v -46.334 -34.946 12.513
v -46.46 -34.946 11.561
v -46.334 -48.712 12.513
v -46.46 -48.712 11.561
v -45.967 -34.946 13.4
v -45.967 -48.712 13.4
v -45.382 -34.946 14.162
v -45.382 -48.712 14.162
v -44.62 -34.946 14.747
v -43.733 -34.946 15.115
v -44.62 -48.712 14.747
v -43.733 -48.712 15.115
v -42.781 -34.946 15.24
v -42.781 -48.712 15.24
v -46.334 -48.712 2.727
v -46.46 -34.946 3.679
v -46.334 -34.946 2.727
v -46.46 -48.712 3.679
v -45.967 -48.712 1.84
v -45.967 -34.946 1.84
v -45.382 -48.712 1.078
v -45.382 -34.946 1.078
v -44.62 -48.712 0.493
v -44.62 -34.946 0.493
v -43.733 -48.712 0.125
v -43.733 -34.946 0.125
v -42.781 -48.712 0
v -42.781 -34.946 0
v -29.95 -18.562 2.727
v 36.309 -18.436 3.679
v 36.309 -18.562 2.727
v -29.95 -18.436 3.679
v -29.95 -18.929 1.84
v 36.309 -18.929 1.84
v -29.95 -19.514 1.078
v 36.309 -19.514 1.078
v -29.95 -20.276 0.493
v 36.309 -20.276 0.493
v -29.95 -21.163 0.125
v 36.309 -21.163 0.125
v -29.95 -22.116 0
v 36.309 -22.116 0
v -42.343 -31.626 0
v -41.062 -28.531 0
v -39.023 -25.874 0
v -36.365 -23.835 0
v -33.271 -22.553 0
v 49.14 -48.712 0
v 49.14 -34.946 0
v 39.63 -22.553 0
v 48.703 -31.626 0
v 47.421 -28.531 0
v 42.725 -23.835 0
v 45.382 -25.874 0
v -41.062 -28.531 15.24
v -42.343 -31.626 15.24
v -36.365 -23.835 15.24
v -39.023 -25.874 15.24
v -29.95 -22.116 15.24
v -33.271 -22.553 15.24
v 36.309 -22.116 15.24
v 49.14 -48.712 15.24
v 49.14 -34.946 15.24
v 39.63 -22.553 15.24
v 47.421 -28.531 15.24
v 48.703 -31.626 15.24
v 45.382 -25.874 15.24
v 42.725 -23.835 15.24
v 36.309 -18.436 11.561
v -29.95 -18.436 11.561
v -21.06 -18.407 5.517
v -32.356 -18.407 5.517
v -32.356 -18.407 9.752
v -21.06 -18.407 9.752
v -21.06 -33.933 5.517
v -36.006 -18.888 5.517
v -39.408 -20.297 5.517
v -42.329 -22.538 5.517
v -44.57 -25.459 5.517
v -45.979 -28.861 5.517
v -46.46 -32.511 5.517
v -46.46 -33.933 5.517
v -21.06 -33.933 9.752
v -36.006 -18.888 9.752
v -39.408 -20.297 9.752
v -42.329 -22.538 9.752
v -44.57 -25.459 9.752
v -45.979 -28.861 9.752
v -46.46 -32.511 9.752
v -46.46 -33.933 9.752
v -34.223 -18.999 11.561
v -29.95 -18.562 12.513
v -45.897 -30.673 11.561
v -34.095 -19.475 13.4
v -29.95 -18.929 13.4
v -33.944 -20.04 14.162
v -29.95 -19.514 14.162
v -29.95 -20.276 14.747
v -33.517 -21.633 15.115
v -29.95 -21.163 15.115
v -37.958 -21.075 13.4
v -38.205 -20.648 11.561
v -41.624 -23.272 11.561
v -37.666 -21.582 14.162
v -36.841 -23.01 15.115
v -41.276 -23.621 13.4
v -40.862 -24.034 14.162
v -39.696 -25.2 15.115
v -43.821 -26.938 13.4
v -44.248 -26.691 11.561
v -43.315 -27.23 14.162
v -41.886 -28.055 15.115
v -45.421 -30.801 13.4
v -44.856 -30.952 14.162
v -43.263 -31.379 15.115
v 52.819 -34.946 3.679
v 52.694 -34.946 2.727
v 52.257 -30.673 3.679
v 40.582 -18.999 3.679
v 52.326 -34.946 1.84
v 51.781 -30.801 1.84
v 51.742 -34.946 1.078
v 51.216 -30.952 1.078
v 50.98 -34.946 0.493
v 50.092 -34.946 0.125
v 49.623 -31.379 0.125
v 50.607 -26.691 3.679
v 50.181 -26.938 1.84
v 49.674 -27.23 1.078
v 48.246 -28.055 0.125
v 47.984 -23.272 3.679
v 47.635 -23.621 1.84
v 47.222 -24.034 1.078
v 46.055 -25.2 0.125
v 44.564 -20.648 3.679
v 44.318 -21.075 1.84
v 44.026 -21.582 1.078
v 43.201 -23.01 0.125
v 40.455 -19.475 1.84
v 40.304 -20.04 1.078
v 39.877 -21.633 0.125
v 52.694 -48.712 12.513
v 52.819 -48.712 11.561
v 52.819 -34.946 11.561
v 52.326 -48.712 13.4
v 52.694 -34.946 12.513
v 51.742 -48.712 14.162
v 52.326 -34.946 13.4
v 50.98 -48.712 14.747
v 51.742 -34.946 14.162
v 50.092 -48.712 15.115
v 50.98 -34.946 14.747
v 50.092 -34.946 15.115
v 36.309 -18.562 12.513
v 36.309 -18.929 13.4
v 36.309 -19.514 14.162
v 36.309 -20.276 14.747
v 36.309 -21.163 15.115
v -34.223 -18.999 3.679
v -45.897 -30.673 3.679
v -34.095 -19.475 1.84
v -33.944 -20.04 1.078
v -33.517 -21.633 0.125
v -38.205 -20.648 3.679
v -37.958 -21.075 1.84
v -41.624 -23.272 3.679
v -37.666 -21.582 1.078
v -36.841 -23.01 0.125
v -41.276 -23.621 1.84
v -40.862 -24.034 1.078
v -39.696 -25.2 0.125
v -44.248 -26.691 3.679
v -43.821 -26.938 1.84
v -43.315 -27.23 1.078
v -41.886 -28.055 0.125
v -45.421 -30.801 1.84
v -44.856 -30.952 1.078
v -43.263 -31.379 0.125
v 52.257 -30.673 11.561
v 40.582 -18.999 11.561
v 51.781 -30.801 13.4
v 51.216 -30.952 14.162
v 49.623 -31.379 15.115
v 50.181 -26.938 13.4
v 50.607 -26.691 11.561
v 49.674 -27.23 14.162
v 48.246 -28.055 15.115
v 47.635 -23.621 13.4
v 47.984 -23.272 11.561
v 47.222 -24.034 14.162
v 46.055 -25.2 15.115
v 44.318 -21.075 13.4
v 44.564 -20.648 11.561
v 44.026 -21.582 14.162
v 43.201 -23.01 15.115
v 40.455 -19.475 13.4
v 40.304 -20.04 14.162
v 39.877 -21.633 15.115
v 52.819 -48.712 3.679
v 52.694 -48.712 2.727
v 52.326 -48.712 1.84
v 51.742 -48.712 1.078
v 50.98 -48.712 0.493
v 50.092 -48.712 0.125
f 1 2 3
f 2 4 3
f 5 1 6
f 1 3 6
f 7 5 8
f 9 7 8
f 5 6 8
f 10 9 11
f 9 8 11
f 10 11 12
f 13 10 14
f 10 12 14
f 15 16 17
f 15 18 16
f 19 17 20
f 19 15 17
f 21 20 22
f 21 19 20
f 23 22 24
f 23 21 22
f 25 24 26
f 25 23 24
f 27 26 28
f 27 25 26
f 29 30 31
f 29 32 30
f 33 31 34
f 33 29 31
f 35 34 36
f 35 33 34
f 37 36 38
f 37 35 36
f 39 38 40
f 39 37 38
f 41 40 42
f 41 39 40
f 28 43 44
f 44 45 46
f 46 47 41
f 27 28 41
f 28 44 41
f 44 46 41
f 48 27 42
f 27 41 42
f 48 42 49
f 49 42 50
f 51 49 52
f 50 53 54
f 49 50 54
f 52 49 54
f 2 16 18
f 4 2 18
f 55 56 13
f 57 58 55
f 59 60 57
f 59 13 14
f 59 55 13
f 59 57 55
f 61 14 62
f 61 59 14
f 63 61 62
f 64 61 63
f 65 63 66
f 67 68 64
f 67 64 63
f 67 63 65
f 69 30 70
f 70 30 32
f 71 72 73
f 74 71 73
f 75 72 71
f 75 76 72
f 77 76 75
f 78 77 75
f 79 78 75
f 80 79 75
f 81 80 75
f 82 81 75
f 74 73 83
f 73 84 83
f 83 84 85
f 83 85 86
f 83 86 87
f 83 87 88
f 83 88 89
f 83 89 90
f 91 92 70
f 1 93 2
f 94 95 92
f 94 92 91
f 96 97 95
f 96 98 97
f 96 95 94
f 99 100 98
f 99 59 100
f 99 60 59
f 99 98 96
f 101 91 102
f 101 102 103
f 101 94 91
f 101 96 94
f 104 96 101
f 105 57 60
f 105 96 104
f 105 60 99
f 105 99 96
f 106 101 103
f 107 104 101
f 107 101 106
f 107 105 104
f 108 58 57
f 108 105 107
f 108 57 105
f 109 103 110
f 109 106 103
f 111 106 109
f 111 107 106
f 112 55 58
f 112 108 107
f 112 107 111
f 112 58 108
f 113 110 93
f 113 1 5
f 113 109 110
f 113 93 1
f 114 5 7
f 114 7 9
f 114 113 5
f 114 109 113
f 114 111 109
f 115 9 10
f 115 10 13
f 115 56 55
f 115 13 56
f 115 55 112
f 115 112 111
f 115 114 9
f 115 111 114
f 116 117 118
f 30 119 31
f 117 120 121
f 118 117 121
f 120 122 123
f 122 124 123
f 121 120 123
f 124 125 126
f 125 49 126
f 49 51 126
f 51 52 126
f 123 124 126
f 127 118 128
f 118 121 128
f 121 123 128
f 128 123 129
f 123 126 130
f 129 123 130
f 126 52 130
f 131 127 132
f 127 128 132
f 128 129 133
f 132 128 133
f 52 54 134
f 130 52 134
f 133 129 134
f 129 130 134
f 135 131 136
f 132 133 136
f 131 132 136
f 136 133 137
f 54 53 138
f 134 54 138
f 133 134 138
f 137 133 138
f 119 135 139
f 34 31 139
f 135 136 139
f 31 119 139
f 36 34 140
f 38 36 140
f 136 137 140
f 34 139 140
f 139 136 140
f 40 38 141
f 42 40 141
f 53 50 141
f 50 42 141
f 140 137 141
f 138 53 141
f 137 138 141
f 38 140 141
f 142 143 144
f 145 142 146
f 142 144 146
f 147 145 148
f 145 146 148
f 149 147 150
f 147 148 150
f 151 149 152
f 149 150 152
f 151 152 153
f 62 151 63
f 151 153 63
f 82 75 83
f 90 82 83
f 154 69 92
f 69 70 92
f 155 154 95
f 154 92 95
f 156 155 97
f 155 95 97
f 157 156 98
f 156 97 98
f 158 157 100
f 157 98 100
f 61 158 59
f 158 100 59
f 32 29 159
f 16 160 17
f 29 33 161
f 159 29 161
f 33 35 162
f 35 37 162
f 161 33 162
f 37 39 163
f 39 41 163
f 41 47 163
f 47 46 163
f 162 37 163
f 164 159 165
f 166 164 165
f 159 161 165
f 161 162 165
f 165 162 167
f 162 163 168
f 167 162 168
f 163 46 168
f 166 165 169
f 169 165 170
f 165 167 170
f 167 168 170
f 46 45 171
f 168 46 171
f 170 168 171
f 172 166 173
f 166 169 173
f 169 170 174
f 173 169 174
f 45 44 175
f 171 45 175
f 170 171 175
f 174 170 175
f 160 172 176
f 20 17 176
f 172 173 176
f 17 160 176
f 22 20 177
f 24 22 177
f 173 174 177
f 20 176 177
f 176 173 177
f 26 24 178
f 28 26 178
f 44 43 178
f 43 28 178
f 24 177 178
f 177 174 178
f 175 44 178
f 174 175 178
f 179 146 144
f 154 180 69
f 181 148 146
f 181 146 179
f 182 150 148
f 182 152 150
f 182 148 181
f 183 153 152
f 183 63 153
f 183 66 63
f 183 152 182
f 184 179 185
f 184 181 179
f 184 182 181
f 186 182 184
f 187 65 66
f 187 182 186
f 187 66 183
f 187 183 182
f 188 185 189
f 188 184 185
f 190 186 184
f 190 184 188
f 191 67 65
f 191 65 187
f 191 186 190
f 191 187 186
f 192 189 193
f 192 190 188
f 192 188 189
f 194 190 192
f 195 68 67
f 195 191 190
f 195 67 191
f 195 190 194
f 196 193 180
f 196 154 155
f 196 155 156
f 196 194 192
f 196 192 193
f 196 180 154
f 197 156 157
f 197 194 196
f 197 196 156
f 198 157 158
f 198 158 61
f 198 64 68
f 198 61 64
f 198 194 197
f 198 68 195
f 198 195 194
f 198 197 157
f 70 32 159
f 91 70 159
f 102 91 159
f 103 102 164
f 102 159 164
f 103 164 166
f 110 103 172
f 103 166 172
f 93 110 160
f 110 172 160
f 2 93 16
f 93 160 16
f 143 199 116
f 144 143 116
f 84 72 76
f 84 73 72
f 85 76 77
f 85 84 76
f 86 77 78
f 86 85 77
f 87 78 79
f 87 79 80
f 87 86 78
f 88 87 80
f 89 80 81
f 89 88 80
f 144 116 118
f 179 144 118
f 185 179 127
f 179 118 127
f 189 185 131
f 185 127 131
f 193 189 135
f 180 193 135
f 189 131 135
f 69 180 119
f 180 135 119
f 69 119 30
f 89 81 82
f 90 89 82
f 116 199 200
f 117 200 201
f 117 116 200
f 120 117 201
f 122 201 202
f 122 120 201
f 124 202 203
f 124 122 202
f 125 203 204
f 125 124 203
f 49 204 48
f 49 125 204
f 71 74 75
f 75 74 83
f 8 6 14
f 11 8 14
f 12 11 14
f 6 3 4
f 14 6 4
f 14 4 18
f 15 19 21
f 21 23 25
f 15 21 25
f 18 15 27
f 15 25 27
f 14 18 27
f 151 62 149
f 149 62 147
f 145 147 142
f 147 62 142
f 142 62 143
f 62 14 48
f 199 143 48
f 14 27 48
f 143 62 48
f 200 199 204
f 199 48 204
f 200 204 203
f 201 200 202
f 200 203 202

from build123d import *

# Parameters (mm, degrees)
F1_DEPTH = 15.24
F2_R     = 3.679261
F3_W     = 15.525822
F3_H     = 4.234315
F4_DEPTH = 25.4
F5_R     = 14.103836


with BuildPart() as f1:
    # F0 (on Top) → F1 (new body)
    with BuildSketch(Plane.XY):
        with BuildLine():
            Line((36.309373, -18.436444), (-29.949842, -18.436444))
            ThreePointArc((-29.949842, -18.436444), (-41.624175, -23.272111), (-46.459842, -34.946444))
            Line((-46.459842, -34.946444), (-46.459842, -48.711527))
            Line((-46.459842, -48.711527), (52.819373, -48.711527))
            Line((52.819373, -48.711527), (52.819373, -34.946444))
            ThreePointArc((52.819373, -34.946444), (47.983706, -23.272111), (36.309373, -18.436444))
        make_face()
    extrude(amount=F1_DEPTH)

    # F2
    f2_edges = [f1.edges().sort_by_distance(p)[0] for p in [
        (3.179765, -18.436444, 15.24),
        (3.179765, -18.436444, 0),
    ]]
    fillet(f2_edges, radius=F2_R)


with BuildPart() as f4:
    # F3 (on face) → F4 (new body)
    with BuildSketch(Plane(origin=(-46.459842, 0, 0), x_dir=(0, -1, 0), z_dir=(-1, 0, 0))):
        with Locations((26.170159, 7.634432)):
            Rectangle(F3_W, F3_H)
    extrude(amount=-F4_DEPTH)

    # F5
    f5_edges = [f4.edges().sort_by_distance(p)[0] for p in [
        (-46.459842, -18.407248, 7.634432),
    ]]
    fillet(f5_edges, radius=F5_R)


solid = Compound([f1.part, f4.part])
